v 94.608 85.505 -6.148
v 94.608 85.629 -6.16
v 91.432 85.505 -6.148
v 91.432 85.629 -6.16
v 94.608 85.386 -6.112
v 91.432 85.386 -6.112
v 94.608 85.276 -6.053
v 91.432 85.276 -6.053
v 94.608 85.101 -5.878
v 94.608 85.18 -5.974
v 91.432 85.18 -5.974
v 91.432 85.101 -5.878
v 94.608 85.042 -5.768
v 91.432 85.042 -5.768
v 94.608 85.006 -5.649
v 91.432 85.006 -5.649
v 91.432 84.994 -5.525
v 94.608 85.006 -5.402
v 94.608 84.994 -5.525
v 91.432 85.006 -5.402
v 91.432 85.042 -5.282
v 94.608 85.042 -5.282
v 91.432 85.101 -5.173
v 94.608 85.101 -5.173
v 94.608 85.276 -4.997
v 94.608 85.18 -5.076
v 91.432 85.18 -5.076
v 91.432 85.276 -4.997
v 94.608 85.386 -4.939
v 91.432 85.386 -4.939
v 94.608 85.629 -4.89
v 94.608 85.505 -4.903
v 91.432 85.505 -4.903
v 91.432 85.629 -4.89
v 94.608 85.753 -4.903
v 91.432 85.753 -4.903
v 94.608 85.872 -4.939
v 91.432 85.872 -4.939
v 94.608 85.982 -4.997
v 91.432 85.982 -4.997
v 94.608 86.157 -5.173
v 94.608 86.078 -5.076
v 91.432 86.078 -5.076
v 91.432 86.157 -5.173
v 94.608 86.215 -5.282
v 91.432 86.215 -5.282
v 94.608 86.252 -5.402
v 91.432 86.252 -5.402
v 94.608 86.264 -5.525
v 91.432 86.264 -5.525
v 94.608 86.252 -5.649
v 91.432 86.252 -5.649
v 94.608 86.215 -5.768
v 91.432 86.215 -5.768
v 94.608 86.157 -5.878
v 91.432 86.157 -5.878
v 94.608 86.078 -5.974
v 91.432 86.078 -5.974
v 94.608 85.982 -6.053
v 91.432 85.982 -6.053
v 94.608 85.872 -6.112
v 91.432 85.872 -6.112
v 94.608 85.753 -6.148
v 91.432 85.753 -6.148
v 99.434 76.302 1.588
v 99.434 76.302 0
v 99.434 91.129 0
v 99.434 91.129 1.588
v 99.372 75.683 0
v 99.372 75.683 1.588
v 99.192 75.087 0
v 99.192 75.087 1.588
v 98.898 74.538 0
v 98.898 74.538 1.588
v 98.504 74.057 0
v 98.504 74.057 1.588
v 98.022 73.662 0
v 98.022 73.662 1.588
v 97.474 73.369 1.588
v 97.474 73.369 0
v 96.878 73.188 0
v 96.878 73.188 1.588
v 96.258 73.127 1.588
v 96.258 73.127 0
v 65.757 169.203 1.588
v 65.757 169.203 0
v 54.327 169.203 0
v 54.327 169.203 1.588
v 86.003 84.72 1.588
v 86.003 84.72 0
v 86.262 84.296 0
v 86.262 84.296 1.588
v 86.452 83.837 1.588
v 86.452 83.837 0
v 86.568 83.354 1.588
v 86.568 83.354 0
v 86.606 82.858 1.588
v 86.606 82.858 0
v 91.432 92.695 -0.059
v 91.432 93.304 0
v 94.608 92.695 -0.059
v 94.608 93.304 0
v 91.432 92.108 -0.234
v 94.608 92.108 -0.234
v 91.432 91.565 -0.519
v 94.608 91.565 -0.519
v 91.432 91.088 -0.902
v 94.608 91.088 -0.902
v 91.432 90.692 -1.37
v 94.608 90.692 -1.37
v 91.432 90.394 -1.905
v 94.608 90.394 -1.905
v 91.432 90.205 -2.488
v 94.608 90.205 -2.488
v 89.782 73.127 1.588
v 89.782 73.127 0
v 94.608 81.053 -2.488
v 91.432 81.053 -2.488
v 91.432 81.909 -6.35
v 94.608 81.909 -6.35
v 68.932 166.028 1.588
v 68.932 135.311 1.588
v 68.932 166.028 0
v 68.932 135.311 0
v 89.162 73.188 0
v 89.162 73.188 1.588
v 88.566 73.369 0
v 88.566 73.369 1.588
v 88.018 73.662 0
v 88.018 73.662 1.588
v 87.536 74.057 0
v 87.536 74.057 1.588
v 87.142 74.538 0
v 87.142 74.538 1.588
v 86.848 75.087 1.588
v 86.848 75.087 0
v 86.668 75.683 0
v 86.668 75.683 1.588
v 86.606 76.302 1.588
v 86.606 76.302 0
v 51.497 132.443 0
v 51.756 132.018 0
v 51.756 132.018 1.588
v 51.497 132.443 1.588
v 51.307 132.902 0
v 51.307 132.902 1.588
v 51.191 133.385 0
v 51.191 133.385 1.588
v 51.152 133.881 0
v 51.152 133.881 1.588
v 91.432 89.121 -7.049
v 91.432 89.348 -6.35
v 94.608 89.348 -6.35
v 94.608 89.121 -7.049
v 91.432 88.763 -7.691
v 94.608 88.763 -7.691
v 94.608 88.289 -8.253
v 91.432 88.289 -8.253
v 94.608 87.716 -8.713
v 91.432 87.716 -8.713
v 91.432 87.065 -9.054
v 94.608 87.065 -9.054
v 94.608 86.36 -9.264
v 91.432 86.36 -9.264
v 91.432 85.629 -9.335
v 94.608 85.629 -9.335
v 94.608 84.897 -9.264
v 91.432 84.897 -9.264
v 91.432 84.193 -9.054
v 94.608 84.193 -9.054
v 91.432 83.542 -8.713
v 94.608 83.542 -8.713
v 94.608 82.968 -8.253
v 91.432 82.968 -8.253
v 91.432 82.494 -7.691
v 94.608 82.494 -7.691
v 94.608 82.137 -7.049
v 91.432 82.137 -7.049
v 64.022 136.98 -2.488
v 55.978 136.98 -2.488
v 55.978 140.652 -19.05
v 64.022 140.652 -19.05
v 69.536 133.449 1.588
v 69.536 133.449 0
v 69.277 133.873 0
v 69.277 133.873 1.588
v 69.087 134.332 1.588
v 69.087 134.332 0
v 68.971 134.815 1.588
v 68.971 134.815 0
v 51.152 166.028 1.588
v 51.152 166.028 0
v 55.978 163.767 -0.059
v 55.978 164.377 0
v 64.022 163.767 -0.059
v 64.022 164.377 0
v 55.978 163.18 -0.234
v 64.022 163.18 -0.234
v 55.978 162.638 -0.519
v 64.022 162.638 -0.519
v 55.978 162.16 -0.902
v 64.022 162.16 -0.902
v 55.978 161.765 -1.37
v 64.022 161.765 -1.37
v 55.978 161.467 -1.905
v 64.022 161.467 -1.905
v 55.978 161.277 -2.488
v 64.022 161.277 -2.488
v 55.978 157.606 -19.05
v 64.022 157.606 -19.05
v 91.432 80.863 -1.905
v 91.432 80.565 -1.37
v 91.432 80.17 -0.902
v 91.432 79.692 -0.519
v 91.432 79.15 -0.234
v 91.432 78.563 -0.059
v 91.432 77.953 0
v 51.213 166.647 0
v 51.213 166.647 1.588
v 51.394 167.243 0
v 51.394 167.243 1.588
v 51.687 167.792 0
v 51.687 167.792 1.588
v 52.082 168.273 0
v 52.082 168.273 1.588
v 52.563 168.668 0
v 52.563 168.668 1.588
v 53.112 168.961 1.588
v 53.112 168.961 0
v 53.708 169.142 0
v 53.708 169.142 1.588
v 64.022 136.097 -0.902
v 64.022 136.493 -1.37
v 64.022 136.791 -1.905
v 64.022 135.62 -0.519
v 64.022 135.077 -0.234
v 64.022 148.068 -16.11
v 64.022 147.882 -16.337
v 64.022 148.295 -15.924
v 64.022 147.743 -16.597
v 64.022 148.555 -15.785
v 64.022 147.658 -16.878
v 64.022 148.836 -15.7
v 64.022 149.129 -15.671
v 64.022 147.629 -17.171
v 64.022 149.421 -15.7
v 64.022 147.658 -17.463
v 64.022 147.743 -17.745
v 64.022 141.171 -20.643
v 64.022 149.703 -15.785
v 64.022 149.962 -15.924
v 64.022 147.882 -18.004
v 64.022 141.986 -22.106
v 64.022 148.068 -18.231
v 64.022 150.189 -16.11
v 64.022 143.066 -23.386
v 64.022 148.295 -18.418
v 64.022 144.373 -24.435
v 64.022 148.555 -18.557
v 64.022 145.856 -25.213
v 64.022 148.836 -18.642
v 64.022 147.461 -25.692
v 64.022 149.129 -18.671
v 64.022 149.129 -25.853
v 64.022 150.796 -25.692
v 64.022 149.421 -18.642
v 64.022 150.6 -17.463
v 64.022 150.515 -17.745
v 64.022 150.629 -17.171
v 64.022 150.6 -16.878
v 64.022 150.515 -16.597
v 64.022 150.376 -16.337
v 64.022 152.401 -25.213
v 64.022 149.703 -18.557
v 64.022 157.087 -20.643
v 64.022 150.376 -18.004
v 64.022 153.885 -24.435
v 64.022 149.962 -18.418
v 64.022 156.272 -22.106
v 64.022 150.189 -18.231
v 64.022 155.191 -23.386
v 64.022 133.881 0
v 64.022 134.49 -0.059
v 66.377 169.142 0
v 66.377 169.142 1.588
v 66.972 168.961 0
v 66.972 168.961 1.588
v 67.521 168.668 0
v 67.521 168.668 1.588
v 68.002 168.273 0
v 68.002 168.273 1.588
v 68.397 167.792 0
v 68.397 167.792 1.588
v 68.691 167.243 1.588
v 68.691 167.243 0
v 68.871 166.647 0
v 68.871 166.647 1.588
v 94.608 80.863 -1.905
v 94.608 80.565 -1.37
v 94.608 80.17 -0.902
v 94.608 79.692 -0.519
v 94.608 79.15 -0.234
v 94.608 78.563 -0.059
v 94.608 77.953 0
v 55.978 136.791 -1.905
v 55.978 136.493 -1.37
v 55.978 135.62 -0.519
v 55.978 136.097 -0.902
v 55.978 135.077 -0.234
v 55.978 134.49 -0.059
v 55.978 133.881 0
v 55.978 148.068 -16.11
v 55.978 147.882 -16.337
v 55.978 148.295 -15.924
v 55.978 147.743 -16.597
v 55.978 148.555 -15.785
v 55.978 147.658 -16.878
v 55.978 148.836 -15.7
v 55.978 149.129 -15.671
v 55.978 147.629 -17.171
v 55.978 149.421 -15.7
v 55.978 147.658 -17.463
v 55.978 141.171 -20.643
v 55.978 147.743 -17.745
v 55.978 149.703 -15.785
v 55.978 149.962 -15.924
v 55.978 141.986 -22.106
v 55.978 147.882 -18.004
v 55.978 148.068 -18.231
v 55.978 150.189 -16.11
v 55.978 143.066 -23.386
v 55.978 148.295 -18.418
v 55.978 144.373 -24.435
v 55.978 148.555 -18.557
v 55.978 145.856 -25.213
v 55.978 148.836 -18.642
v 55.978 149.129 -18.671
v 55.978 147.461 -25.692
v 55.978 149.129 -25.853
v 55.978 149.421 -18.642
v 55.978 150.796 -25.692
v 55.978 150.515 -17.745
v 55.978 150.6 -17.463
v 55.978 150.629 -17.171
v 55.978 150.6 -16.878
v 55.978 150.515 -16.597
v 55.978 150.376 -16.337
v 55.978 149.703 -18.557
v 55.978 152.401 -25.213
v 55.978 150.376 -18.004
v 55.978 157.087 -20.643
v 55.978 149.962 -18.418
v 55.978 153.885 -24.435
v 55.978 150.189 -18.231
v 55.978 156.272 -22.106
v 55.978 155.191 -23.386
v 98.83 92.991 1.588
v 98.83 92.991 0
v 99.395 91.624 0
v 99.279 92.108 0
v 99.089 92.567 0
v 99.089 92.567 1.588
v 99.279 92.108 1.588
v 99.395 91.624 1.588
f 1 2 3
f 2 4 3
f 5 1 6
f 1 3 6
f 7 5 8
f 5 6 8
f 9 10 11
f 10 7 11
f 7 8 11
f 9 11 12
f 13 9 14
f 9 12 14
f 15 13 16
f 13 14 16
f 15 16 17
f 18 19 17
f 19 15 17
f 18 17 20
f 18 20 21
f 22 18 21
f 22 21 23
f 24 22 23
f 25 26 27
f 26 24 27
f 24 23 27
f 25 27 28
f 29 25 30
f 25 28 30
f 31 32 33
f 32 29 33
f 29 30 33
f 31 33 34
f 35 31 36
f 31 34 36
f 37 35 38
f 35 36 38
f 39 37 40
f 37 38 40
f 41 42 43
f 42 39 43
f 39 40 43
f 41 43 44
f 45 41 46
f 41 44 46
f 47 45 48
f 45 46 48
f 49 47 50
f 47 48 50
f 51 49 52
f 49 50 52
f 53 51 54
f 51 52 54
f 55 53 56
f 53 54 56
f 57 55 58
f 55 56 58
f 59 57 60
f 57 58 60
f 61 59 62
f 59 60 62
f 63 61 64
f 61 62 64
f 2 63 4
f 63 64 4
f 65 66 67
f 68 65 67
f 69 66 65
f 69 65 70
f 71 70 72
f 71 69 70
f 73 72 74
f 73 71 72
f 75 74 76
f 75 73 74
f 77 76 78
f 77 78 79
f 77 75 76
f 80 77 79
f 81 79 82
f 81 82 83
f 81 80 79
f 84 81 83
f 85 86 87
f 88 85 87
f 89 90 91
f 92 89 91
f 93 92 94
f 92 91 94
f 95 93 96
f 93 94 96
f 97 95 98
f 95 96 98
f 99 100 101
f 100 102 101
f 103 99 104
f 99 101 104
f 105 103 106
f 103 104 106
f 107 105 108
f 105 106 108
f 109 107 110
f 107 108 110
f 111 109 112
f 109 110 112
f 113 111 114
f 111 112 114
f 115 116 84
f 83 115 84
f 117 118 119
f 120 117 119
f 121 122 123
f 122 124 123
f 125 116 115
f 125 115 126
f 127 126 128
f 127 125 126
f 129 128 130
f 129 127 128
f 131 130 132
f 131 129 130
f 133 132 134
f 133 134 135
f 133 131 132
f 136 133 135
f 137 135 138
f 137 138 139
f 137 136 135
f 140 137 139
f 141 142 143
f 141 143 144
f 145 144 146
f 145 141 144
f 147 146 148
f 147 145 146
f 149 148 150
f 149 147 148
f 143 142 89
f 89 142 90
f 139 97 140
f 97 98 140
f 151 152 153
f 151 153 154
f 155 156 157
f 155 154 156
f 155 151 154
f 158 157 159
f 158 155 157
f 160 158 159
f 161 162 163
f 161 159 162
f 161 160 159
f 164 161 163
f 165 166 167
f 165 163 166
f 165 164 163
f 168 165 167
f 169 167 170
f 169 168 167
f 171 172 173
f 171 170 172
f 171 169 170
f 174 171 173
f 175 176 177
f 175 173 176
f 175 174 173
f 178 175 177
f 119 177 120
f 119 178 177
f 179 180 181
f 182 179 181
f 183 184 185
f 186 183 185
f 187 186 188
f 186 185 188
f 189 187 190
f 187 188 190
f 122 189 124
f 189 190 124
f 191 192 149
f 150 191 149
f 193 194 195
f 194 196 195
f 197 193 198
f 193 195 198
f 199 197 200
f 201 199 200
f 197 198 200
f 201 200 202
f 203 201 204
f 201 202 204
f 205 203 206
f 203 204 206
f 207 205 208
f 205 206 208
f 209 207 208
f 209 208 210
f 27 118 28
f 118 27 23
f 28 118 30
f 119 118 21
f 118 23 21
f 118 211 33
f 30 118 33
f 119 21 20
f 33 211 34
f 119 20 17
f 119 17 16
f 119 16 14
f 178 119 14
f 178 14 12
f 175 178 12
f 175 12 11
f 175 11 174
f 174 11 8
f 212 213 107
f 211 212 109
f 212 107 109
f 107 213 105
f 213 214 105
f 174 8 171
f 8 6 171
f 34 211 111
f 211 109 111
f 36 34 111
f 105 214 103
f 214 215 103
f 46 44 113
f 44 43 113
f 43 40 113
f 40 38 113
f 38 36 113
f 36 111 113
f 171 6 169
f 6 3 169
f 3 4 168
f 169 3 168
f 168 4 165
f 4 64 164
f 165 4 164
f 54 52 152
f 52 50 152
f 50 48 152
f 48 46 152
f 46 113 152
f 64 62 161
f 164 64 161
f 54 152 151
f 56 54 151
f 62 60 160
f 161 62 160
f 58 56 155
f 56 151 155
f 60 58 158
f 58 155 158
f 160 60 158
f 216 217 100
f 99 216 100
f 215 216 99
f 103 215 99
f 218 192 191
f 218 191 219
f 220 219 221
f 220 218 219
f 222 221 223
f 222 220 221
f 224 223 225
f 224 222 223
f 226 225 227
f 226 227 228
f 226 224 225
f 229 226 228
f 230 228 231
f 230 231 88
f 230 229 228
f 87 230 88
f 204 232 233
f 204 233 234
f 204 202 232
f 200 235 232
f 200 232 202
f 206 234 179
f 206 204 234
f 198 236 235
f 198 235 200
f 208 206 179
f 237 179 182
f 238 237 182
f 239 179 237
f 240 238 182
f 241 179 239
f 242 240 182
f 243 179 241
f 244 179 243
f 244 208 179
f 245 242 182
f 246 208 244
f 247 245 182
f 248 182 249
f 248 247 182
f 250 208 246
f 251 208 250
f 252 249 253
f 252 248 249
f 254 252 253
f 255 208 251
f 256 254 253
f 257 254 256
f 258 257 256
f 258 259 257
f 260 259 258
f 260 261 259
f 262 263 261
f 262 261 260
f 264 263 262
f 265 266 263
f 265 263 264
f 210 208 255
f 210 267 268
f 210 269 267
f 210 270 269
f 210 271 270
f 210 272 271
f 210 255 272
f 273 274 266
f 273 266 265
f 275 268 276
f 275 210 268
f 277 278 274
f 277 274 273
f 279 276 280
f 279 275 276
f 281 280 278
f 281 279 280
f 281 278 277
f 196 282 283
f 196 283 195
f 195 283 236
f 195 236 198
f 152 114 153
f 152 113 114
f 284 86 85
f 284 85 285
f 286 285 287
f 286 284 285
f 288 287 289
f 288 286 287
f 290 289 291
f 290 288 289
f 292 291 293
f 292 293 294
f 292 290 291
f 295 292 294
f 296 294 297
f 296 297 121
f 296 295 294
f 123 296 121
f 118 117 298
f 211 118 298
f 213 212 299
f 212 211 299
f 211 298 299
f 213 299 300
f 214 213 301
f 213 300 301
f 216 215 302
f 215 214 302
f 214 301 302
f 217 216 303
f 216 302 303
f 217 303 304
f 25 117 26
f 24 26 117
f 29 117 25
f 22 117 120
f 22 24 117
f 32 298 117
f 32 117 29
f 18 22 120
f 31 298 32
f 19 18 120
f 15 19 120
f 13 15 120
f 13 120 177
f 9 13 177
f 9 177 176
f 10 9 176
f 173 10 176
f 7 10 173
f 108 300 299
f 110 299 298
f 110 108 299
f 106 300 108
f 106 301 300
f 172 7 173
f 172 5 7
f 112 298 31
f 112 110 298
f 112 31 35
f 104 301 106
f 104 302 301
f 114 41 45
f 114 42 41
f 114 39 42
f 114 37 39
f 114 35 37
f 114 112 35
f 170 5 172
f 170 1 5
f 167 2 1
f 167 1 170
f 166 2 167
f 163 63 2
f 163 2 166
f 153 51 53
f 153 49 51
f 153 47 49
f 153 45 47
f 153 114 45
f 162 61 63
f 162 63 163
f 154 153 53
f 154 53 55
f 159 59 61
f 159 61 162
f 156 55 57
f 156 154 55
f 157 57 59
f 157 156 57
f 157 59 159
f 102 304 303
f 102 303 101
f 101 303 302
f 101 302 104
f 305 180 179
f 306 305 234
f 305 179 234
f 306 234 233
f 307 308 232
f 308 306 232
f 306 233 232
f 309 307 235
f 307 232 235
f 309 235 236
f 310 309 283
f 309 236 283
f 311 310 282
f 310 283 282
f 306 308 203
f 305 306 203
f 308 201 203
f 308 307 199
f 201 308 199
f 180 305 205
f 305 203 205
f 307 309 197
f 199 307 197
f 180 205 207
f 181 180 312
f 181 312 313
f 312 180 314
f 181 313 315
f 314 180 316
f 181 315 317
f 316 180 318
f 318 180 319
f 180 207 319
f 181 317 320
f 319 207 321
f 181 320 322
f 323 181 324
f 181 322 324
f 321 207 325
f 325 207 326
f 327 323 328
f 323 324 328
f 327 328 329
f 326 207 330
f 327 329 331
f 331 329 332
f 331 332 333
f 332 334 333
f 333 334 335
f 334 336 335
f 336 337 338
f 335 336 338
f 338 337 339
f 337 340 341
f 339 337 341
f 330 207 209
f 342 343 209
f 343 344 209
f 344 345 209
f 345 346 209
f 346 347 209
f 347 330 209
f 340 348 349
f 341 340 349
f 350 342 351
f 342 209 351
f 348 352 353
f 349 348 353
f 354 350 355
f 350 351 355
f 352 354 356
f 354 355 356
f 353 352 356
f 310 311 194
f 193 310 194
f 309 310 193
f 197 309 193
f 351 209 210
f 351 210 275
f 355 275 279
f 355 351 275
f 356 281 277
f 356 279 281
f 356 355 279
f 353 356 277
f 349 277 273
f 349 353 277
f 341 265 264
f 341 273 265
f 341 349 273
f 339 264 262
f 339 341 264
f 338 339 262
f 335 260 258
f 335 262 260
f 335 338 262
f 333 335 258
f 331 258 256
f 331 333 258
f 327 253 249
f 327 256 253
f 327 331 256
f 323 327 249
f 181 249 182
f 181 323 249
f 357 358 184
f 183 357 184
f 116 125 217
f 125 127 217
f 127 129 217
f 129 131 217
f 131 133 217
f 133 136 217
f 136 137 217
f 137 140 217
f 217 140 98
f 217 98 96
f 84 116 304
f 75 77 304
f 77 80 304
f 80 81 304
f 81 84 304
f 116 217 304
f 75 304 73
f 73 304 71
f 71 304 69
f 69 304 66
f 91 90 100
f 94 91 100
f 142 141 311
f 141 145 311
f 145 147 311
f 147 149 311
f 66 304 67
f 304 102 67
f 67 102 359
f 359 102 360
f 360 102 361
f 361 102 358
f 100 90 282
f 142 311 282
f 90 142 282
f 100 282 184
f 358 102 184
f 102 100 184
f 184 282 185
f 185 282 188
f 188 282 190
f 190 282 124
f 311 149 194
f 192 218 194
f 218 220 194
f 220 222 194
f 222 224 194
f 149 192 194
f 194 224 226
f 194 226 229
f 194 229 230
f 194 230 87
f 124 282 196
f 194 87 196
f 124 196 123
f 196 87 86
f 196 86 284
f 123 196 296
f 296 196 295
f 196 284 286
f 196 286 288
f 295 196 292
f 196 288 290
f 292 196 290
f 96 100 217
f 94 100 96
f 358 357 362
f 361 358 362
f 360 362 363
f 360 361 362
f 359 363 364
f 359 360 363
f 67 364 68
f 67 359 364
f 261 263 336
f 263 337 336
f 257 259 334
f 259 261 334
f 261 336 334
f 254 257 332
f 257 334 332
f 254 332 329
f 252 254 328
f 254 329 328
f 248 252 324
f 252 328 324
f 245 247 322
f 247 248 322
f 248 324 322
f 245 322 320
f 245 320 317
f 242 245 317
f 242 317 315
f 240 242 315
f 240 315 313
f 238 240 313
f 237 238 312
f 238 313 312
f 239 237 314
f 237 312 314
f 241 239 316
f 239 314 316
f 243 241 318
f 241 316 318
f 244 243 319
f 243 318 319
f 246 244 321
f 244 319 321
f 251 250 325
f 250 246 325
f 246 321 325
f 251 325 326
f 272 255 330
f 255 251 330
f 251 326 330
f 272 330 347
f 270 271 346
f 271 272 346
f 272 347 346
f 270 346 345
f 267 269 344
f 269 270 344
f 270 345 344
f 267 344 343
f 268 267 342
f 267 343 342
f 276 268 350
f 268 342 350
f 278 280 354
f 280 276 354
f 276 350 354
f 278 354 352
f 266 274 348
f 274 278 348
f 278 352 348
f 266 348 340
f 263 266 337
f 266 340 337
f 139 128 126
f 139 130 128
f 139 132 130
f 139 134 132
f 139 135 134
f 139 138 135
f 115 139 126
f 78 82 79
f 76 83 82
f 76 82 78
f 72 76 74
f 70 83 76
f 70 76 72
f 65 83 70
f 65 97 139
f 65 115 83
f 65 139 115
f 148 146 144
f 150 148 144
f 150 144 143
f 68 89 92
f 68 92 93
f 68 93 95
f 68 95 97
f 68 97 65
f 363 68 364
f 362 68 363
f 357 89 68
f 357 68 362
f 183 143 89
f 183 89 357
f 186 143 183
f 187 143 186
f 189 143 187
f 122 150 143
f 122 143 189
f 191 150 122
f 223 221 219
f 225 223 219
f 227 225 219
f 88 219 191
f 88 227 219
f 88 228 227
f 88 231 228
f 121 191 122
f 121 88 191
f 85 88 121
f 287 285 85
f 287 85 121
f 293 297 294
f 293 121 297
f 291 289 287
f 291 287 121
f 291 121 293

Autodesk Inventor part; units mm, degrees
ref_plane "YZ Plane" through (0, 0, 0) normal (1, 0, 0) x (0, 1, 0)
ref_plane "XZ Plane" through (0, 0, 0) normal (0, 1, 0) x (-1, 0, 0)
sketch "Sketch1" plane through (0, 0, 0) normal (0, 0, 1) x (1, 0, 0)
  line L0 (0, 0) -> (120, 0)
  line L1 (120, 0) -> (120, 198.5)
  line L2 (120, 198.5) -> (0, 198.5)
  line L3 (0, 198.5) -> (0, 0)
  dimension "d0" = 120
  dimension "d1" = 198.5
extrude "Extrusion1" add sketch "Sketch1" along normal blind 1.5875
ref_plane "Work Plane1" through (60, 0, 0) normal (1, 0, 0) x (0, 0, -1)
sketch "Sketch2" plane through (60, 0, 0) normal (1, 0, 0) x (0, 0, -1)
  line L0 (0, 161.8288) -> (19.05, 157.6055)
  line L1 (0, 136.4288) -> (19.05, 140.6521)
  line L2 (0, 178.6416) -> (0, 113.5366)
  arc A0 (19.05, 140.6521) -> (19.05, 157.6055) centre (17.1708, 149.1288) ccw
  circle A1 centre (17.1708, 149.1288) radius 1.5
  line L3 (0, 0) -> (0, 198.5) projected
  dimension "d4" = 25.4
  dimension "d7" = 19.05
  dimension "d8" = 102.5
  dimension "d9" = 102.5
  dimension "d10" = 3
extrude "Extrusion2" add sketch "Sketch2" along normal mid plane 8.0433
fillet "Fillet1" radius 3.175 2 edges at (60, 136.4288, 0) (60, 161.8288, 0)
ref_plane "Work Plane2" through (93.02, 0, 0) normal (1, 0, 0) x (0, 0, -1)
sketch "Sketch3" plane through (93.02, 0, 0) normal (1, 0, 0) x (0, 0, -1)
  line L0 (0, 90.7562) -> (6.35, 89.3485)
  line L1 (0, 80.5013) -> (6.35, 81.9091)
  line L2 (0, 0) -> (0, 198.5) projected
  arc A0 (6.35, 81.9091) -> (6.35, 89.3485) centre (5.5254, 85.6288) ccw
  circle A1 centre (5.5254, 85.6288) radius 0.635
  circle A2 centre (17.1708, 149.1288) radius 1.5 projected
  line L3 (0, 90.7562) -> (0, 80.5013)
  dimension "d14" = 6.35
  dimension "d15" = 102.5
  dimension "d16" = 102.5
  dimension "d17" = 1.27
  dimension "d18" = 3.175
  dimension "d19" = 63.5
extrude "Extrusion3" add sketch "Sketch3" along normal mid plane 3.175 contours L0 A0 L1 L2
fillet "Fillet2" radius 3.175 2 edges at (93.02, 90.7562, 0) (93.02, 80.5013, 0)
sketch "Sketch6" plane through (0, 0, 0) normal (0, 0, -1) x (-1, 0, 0)
  line L0 (0, 0) -> (-120, 0) projected
  line L1 (0, 198.5) -> (0, 0) projected
  line L2 (-120, 198.5) -> (0, 198.5) projected
  line L3 (-120, 0) -> (-120, 198.5) projected
  line L4 (-89.7815, 73.1271) -> (-96.2585, 73.1271)
  line L5 (-65.7573, 169.203) -> (-54.3273, 169.203)
  line L6 (-51.1523, 166.028) -> (-51.1523, 133.8806)
  line L7 (-51.7557, 132.0185) -> (-86.0031, 84.7203)
  line L8 (-86.6065, 82.8583) -> (-86.6065, 76.3021)
  arc A0 (-86.0031, 84.7203) -> (-86.6065, 82.8583) centre (-83.4315, 82.8583) ccw
  arc A1 (-51.1523, 166.028) -> (-54.3273, 169.203) centre (-54.3273, 166.028) ccw
  arc A2 (-51.7557, 132.0185) -> (-51.1523, 133.8806) centre (-54.3273, 133.8806) ccw
  arc A3 (-89.7815, 73.1271) -> (-86.6065, 76.3021) centre (-89.7815, 76.3021) ccw
  arc A4 (-99.4335, 76.3021) -> (-96.2585, 73.1271) centre (-96.2585, 76.3021) ccw
  line L9 (-55.9783, 164.377) -> (-64.0217, 164.377) projected
  line L10 (-99.4335, 76.3021) -> (-99.4335, 91.129)
  line L11 (-98.8301, 92.991) -> (-69.5357, 133.4487)
  line L12 (-68.9323, 135.3108) -> (-68.9323, 166.028)
  arc A5 (-65.7573, 169.203) -> (-68.9323, 166.028) centre (-65.7573, 166.028) ccw
  arc A6 (-98.8301, 92.991) -> (-99.4335, 91.129) centre (-96.2585, 91.129) ccw
  arc A7 (-69.5357, 133.4487) -> (-68.9323, 135.3108) centre (-72.1073, 135.3108) ccw
  line L13 (-55.9783, 164.377) -> (-55.9783, 133.8806) projected
  line L14 (-64.0217, 133.8806) -> (-64.0217, 164.377) projected
  line L15 (-94.6075, 77.9531) -> (-94.6075, 93.3044) projected
  line L16 (-91.4325, 93.3044) -> (-91.4325, 77.9531) projected
  line L17 (-94.6075, 77.9531) -> (-91.4325, 77.9531) projected
  line L18 (-64.0217, 133.8806) -> (-55.9783, 133.8806) projected
  dimension "d24" = 3.175
  dimension "d27" = 3.175
  dimension "d28" = 15.24
  dimension "d30" = 17.78
  dimension "d31" = 3.175
  dimension "d32" = 3.175
  dimension "d33" = 3.175
  dimension "d34" = 3.175
  dimension "d35" = 3.175
  dimension "d36" = 3.175
  dimension "d37" = 4.826
  dimension "d38" = 4.9107
  dimension "d39" = 4.826
  dimension "d40" = 4.826
  dimension "d41" = 4.826
  dimension "d43" = 4.826
extrude "Extrusion4" cut sketch "Sketch6" against normal through all contours L0 L3 L2 L1
equation "\"d0\" = TabletWidth"
equation "\"d1\" = TabletHeight"
equation "\"d4\" = PivotWidth"
equation "\"d7\" = PivotHeight"
equation "\"d8\" = PivotAngle"
equation "\"d9\" = PivotAngle"
equation "\"d10\" = HingeHoleDiameter"
equation "\"d22\" = d18"
equation "\"d15\" = PivotAngle"
equation "\"d16\" = PivotAngle"
equation "\"d20\" = d18"
equation "\"d23\" = d18"
equation "\"d24\" = d18"
equation "\"d27\" = d18"
equation "\"d31\" = d18"
equation "\"d39\" = d37"
equation "\"d40\" = d37"
equation "\"d41\" = d37"
equation "\"d43\" = d37"
equation "\"TabletWidth\" = 120"
equation "\"TabletHeight\" = 198.5"
equation "\"PivotWidth\" = 25.4"
equation "\"PivotHeight\" = 19.05"
equation "\"PivotAngle\" = 102.5deg"
equation "\"HingeHoleDiameter\" = 3"
properties part number "TableMount-Holder" material "ABS Plastic"
